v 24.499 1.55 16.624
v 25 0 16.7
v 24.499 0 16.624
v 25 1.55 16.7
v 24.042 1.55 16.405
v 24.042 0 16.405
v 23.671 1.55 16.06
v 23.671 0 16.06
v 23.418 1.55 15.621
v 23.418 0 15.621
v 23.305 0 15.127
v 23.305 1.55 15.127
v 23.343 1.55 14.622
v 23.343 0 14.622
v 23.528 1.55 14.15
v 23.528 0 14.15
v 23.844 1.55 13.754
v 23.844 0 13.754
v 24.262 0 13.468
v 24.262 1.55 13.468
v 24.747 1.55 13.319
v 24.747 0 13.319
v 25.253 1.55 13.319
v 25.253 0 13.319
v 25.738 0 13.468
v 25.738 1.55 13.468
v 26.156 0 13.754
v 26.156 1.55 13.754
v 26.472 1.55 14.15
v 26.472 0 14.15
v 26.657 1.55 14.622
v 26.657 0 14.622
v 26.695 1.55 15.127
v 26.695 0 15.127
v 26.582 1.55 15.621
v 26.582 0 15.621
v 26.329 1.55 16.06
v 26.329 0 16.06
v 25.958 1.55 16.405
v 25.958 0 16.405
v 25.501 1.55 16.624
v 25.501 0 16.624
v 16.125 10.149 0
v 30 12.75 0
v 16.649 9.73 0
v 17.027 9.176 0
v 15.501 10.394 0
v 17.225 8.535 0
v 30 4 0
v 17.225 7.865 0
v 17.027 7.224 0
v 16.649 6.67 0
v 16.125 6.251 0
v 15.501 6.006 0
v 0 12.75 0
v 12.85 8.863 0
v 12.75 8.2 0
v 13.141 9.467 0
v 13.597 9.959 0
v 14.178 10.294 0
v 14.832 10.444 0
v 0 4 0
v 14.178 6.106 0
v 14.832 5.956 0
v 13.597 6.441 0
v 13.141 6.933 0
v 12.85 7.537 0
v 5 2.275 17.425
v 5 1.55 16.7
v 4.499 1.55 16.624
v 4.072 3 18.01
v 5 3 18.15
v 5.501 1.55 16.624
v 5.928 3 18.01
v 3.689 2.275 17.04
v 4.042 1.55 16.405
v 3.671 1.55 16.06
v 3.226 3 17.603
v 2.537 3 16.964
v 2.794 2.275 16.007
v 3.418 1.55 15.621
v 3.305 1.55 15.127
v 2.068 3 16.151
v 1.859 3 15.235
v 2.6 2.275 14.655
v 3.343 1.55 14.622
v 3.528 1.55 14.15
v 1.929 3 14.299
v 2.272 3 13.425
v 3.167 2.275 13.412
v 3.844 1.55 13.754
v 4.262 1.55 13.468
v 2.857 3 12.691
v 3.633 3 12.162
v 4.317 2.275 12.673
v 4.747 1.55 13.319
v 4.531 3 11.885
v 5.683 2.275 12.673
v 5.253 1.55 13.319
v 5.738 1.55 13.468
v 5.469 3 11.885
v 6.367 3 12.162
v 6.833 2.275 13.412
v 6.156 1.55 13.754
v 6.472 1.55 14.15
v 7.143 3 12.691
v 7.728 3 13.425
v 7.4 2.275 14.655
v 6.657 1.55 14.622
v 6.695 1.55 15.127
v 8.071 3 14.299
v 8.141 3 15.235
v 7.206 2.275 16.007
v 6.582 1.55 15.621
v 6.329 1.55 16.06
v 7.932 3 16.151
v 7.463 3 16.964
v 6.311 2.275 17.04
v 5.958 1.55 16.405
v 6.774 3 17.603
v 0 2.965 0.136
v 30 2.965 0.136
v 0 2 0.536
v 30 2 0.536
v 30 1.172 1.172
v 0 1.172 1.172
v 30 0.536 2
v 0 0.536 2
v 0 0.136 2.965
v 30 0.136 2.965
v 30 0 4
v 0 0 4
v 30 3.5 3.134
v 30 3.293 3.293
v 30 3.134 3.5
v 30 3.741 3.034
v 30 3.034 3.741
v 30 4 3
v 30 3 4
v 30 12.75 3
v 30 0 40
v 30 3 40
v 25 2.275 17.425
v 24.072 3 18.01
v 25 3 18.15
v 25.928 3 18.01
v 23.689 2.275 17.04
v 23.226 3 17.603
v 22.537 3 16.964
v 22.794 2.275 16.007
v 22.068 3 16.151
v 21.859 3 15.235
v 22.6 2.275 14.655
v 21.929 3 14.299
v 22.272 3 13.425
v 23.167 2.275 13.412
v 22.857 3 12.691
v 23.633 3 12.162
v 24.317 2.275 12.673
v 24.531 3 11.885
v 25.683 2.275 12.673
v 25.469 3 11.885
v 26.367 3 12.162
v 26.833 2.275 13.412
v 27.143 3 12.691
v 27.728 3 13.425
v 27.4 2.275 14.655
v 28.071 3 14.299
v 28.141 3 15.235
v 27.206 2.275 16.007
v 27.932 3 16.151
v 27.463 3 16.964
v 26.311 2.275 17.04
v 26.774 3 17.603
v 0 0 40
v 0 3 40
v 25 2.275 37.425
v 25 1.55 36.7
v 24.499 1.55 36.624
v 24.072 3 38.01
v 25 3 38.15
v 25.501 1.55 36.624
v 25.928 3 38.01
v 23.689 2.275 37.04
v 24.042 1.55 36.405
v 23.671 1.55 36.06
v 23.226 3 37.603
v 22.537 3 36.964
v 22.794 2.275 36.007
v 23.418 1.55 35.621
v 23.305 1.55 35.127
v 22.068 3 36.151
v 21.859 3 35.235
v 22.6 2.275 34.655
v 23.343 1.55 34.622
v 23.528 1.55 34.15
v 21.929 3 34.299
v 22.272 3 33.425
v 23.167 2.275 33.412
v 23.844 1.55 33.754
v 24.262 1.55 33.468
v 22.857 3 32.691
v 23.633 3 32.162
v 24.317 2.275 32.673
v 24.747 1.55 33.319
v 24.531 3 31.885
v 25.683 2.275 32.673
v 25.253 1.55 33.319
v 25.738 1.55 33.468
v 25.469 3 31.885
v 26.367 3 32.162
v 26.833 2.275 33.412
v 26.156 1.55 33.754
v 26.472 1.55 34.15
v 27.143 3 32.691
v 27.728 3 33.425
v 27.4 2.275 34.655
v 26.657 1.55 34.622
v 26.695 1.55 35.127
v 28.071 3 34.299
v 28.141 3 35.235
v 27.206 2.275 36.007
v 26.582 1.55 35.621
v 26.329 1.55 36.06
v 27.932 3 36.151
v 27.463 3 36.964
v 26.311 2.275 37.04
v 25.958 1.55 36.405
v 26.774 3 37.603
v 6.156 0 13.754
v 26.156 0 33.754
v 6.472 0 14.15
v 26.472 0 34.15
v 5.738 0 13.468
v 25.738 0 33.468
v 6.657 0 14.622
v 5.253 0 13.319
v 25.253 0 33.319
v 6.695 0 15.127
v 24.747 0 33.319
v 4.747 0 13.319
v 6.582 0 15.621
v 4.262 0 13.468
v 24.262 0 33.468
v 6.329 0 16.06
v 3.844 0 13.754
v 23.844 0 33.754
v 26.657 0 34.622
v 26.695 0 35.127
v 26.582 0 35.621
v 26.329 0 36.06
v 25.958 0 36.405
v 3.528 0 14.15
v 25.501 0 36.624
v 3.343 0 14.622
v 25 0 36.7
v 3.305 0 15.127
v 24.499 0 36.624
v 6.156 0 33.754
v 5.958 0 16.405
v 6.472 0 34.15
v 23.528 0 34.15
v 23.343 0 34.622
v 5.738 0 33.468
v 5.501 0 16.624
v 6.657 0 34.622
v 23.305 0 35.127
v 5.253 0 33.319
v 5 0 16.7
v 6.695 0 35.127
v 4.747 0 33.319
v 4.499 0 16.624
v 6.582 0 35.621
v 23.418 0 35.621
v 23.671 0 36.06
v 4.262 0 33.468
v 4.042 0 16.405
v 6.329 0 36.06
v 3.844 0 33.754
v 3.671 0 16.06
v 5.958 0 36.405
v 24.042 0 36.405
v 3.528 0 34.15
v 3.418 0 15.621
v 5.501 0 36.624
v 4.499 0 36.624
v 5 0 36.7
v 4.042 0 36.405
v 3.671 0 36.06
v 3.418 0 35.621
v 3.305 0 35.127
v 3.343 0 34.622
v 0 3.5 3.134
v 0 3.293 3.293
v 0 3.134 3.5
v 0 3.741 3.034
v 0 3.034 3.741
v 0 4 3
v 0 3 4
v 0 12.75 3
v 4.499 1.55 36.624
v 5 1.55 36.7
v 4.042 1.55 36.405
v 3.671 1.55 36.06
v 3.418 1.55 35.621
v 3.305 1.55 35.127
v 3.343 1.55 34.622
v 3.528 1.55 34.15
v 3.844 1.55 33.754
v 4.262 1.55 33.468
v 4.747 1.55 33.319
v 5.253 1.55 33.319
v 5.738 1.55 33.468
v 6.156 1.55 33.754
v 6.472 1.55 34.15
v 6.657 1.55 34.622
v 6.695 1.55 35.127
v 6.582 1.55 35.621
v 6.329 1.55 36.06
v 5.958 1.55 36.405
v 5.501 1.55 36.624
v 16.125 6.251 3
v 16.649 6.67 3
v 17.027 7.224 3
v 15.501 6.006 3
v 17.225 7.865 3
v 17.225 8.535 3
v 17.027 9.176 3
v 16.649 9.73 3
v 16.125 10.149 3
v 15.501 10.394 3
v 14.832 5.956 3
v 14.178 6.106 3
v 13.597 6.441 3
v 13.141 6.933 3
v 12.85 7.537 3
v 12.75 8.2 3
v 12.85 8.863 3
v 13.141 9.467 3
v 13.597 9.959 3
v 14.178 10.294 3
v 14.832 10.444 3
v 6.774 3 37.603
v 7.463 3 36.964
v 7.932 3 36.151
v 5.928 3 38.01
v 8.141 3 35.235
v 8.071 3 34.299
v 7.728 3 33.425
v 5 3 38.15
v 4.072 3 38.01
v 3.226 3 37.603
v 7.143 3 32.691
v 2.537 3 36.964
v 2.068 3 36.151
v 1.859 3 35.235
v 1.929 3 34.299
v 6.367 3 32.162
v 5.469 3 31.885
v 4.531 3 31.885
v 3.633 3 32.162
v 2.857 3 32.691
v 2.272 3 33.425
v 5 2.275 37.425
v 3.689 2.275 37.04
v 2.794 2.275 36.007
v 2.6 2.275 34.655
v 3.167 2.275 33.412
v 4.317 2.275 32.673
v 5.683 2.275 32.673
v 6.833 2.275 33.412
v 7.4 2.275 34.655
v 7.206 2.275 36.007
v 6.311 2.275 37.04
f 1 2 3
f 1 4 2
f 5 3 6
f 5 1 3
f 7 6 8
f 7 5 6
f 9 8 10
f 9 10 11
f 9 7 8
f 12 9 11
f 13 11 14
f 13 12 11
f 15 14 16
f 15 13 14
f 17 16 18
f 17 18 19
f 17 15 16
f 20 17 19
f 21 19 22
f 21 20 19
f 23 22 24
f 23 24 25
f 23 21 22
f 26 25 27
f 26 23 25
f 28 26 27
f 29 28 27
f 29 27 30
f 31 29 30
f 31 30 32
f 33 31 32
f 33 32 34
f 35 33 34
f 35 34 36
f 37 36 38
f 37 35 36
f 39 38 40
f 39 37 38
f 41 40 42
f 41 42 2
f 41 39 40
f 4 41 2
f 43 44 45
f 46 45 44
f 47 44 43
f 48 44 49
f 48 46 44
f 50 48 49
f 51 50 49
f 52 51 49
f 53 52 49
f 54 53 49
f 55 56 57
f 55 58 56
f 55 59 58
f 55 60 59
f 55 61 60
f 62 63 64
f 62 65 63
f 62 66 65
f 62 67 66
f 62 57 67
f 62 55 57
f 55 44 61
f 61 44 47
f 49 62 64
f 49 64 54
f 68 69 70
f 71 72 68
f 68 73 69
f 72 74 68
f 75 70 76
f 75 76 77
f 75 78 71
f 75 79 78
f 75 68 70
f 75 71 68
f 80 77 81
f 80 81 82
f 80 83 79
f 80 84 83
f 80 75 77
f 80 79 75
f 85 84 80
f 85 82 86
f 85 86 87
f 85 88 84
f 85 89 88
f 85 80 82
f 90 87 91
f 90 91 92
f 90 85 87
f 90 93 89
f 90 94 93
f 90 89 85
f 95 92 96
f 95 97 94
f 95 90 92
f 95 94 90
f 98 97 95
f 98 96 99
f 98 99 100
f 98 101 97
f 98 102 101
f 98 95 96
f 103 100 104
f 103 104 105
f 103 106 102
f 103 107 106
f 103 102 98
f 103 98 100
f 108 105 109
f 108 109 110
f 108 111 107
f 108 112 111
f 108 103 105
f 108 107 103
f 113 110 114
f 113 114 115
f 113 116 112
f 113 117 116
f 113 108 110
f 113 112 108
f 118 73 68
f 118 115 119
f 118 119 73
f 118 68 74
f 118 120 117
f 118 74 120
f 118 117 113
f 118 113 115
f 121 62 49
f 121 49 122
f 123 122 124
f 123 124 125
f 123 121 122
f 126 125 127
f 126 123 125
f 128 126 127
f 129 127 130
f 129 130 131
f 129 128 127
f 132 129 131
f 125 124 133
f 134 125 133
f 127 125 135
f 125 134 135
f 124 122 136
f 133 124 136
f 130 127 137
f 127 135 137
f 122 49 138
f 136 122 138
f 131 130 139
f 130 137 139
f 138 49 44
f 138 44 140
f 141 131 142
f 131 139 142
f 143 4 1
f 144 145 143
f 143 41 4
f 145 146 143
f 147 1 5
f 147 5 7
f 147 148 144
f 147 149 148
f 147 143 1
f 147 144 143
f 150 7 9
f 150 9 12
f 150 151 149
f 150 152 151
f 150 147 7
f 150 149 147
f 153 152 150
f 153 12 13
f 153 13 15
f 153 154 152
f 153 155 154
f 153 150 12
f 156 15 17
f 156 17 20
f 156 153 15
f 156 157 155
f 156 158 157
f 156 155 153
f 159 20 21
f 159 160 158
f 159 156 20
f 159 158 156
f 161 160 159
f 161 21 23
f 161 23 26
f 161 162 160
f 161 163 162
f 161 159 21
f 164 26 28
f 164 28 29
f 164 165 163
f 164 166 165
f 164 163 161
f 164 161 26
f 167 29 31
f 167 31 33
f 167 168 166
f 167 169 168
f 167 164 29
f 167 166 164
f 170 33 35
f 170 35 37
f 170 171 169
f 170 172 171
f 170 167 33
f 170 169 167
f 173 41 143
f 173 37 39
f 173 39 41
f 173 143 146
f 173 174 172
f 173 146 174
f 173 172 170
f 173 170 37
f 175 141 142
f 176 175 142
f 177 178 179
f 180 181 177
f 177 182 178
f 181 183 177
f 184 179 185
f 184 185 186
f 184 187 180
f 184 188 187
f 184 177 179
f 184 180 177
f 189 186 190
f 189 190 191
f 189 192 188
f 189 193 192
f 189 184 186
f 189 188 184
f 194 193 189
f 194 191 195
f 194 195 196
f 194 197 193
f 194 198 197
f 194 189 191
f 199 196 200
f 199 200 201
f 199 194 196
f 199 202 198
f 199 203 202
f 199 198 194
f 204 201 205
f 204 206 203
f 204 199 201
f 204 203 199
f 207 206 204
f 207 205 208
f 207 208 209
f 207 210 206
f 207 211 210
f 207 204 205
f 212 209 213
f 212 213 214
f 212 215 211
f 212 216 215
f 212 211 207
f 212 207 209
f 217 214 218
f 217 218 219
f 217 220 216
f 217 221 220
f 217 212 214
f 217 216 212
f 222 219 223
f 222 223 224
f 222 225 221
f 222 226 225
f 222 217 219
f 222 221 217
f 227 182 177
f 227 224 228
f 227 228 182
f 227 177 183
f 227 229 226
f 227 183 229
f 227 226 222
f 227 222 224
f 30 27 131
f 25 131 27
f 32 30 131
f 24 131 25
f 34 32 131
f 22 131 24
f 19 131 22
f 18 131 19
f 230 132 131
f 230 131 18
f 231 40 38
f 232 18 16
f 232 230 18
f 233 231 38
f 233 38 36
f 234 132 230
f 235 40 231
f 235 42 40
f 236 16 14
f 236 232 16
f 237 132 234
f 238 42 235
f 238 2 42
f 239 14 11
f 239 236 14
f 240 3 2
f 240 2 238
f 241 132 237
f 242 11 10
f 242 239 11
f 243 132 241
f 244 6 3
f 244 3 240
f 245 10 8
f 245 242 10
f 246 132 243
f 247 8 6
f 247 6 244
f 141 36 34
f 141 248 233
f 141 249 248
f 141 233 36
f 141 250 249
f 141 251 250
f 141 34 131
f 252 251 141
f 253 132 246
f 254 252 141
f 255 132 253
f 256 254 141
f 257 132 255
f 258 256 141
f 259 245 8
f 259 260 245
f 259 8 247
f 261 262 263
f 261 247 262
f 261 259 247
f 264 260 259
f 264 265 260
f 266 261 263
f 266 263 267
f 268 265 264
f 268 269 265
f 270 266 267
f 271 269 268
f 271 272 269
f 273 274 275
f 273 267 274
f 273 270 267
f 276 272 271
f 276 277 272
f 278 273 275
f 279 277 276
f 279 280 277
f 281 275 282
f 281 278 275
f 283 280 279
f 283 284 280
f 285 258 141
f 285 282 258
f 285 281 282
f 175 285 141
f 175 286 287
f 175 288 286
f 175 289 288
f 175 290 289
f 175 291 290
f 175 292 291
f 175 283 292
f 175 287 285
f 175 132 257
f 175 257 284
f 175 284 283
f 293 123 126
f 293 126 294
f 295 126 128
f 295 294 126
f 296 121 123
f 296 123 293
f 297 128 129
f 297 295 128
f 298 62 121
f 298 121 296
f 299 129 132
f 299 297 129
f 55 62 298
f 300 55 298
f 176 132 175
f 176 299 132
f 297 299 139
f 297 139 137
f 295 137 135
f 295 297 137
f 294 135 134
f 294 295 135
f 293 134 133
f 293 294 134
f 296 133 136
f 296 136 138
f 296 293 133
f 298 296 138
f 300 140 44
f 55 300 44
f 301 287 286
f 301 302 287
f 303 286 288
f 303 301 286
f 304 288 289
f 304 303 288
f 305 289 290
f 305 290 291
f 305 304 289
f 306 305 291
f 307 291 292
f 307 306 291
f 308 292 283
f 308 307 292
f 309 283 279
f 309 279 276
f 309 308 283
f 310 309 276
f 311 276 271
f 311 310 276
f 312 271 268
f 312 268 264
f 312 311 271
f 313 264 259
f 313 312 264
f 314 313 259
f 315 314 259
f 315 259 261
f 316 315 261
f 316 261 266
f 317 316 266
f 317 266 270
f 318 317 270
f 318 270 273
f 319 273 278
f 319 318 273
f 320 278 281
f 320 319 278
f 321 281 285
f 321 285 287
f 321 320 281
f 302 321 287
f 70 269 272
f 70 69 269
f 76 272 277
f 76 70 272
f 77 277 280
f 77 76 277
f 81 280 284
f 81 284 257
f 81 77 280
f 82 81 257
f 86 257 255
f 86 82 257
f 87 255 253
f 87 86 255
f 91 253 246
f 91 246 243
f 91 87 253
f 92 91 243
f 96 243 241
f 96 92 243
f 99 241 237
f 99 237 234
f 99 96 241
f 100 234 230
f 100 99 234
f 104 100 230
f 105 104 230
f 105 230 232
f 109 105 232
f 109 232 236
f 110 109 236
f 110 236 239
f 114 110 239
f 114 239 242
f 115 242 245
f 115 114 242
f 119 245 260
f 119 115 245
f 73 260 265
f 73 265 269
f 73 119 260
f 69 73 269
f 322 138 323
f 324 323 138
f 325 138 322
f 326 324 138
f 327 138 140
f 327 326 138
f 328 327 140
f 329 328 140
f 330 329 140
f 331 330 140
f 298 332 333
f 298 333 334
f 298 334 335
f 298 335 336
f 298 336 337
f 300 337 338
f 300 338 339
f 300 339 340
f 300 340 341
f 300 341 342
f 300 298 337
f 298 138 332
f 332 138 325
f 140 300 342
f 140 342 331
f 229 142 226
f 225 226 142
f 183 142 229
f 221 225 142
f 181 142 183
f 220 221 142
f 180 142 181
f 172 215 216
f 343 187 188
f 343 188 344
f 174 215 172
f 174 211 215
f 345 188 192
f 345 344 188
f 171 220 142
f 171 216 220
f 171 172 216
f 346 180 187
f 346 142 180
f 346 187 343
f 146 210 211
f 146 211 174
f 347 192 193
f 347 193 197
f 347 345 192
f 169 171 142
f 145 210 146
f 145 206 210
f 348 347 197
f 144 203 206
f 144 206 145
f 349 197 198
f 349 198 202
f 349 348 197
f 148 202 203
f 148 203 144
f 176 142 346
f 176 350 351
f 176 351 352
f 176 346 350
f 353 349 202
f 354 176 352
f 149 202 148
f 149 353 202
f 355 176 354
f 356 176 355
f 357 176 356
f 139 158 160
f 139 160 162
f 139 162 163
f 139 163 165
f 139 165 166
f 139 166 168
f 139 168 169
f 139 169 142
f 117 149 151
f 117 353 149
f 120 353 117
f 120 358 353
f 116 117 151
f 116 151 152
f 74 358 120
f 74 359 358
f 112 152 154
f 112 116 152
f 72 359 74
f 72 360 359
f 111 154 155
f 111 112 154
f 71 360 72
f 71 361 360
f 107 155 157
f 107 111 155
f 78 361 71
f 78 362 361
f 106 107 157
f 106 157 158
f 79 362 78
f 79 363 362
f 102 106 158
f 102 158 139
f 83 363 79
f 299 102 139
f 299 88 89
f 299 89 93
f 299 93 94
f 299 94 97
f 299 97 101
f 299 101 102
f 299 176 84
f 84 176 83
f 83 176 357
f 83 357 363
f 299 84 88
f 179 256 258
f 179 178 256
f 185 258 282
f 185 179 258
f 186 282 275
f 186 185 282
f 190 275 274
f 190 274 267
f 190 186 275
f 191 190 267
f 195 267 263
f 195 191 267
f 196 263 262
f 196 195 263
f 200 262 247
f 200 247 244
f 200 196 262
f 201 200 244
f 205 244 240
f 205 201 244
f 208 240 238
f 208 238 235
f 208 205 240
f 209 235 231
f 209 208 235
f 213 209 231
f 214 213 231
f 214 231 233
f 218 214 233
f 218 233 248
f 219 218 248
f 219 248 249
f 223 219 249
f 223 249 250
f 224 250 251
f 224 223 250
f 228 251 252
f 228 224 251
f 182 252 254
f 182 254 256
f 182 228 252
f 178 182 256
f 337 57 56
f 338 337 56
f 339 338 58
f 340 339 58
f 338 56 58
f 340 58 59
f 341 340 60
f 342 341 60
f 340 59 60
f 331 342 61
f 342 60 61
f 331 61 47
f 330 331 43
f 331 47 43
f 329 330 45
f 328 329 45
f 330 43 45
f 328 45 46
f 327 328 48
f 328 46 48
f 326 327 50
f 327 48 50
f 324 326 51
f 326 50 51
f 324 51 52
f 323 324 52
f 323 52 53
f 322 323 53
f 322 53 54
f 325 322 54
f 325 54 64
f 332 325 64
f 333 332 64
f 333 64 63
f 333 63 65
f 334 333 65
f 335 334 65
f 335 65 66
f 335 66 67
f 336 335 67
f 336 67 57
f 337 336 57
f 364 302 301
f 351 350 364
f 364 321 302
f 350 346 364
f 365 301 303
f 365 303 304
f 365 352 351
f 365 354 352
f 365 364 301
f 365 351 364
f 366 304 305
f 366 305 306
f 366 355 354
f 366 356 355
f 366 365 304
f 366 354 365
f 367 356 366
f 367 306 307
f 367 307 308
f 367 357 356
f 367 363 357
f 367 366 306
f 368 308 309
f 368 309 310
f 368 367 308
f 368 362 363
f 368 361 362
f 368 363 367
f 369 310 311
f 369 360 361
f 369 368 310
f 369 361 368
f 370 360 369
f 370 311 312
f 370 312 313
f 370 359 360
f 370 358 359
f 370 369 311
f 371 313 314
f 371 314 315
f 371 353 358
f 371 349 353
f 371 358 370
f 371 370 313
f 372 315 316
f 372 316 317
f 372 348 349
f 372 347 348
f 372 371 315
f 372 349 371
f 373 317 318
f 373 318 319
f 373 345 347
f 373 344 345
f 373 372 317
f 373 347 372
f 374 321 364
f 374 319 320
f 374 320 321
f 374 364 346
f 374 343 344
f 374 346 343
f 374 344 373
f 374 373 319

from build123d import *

# Parameters (mm, degrees)
T_LE_DE_BASE_PLI_E1_DEPTH                   = 30
FRAISAGE_POUR_VIS_T_TE_FRAIS_E_M31_AT_COUNT = 2
FRAISAGE_POUR_VIS_T_TE_FRAIS_E_M31_AT_PITCH = 20
FRAISAGE_POUR_VIS_T_TE_FRAIS_E_M31_2_COUNT  = 2
FRAISAGE_POUR_VIS_T_TE_FRAIS_E_M31_2_PITCH  = 28.284271247
FRAISAGE_POUR_VIS_T_TE_FRAIS_E_M31_3_COUNT  = 2
FRAISAGE_POUR_VIS_T_TE_FRAIS_E_M31_3_PITCH  = 20
D_GAGEMENT_M41_D                            = 4.5


# Sheet-metal steps are written as plain solids
with BuildPart() as part:
    # Esquisse1 → Tôle de base pliée1 (new body)
    with BuildSketch(Plane(origin=(0, 0, 0), x_dir=(0, 0, -1), z_dir=(1, 0, 0))):
        with BuildLine():
            Line((0, 12.75), (0, 4))
            ThreePointArc((0, 4), (-1.171572875, 1.171572875), (-4, 0))
            Line((-4, 0), (-40, 0))
            Line((-40, 0), (-40, 3))
            Line((-40, 3), (-4, 3))
            ThreePointArc((-4, 3), (-3.292893219, 3.292893219), (-3, 4))
            Line((-3, 4), (-3, 12.75))
            Line((-3, 12.75), (0, 12.75))
        make_face()
    extrude(amount=T_LE_DE_BASE_PLI_E1_DEPTH)

    # Esquisse7 → Fraisage pour vis à tête fraisée M31 (revolve, cut)
    with BuildSketch(Plane(origin=(5, 3, 35), x_dir=(0, 0, 1), z_dir=(1, 0, 0))):
        Polygon((0, 0), (0, 3), (1.7, 3), (1.7, 1.45), (3.15, 0), align=None)
    fraisage_pour_vis_t_te_frais_e_m31 = revolve(axis=Axis((5, 9.35, 35), (0, -1, 0)), mode=Mode.SUBTRACT)

    # Fraisage pour vis à tête fraisée M31 at: Fraisage pour vis à tête fraisée M31 ×2
    with Locations(*[(0, 0, -i * FRAISAGE_POUR_VIS_T_TE_FRAIS_E_M31_AT_PITCH) for i in range(1, FRAISAGE_POUR_VIS_T_TE_FRAIS_E_M31_AT_COUNT)]):
        add(fraisage_pour_vis_t_te_frais_e_m31, mode=Mode.SUBTRACT)

    # Fraisage pour vis _ t_te frais_e M31 2: Fraisage pour vis à tête fraisée M31 ×2
    with Locations(*[Vector(0.7071067811865476, 0, -0.7071067811865475) * (i * FRAISAGE_POUR_VIS_T_TE_FRAIS_E_M31_2_PITCH) for i in range(1, FRAISAGE_POUR_VIS_T_TE_FRAIS_E_M31_2_COUNT)]):
        add(fraisage_pour_vis_t_te_frais_e_m31, mode=Mode.SUBTRACT)

    # Fraisage pour vis _ t_te frais_e M31 3: Fraisage pour vis à tête fraisée M31 ×2
    with Locations(*[(i * FRAISAGE_POUR_VIS_T_TE_FRAIS_E_M31_3_PITCH, 0, 0) for i in range(1, FRAISAGE_POUR_VIS_T_TE_FRAIS_E_M31_3_COUNT)]):
        add(fraisage_pour_vis_t_te_frais_e_m31, mode=Mode.SUBTRACT)

    # Dégagement M41 (through all)
    with Locations(Plane.XY.offset(3)):
        with Locations((15, 8.2)):
            Hole(D_GAGEMENT_M41_D / 2)


solid = part.part
